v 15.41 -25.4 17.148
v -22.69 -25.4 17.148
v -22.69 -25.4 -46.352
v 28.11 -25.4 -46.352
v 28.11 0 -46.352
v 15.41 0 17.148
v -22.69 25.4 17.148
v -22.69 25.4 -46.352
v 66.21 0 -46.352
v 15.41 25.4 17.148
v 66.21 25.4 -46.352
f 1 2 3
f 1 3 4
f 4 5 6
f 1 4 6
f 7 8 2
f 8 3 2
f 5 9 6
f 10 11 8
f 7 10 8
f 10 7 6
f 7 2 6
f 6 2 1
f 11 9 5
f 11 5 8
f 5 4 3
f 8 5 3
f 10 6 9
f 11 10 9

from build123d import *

# Parameters (mm, degrees)
F1_DEPTH = 25.4
F3_DEPTH = 25.4


with BuildPart() as f1:
    # F0 (on Front) → F1 (new body)
    with BuildSketch(Plane.XZ):
        Polygon((-22.690213, 17.148396), (-22.690213, -46.351604), (28.109787, -46.351604), (15.409787, 17.148396), align=None)
    extrude(amount=F1_DEPTH)

    # F2 (on face) → F3 (join)
    with BuildSketch(Plane(origin=(0, 0, 0), x_dir=(-1, 0, 0), z_dir=(0, 1, 0))):
        Polygon((-66.209787, -46.351604), (-28.109787, -46.351604), (-15.409787, 17.148396), align=None)
        Polygon((-28.109787, -46.351604), (22.690213, -46.351604), (22.690213, 17.148396), (-15.409787, 17.148396), align=None)
    extrude(amount=F3_DEPTH)


solid = f1.part
